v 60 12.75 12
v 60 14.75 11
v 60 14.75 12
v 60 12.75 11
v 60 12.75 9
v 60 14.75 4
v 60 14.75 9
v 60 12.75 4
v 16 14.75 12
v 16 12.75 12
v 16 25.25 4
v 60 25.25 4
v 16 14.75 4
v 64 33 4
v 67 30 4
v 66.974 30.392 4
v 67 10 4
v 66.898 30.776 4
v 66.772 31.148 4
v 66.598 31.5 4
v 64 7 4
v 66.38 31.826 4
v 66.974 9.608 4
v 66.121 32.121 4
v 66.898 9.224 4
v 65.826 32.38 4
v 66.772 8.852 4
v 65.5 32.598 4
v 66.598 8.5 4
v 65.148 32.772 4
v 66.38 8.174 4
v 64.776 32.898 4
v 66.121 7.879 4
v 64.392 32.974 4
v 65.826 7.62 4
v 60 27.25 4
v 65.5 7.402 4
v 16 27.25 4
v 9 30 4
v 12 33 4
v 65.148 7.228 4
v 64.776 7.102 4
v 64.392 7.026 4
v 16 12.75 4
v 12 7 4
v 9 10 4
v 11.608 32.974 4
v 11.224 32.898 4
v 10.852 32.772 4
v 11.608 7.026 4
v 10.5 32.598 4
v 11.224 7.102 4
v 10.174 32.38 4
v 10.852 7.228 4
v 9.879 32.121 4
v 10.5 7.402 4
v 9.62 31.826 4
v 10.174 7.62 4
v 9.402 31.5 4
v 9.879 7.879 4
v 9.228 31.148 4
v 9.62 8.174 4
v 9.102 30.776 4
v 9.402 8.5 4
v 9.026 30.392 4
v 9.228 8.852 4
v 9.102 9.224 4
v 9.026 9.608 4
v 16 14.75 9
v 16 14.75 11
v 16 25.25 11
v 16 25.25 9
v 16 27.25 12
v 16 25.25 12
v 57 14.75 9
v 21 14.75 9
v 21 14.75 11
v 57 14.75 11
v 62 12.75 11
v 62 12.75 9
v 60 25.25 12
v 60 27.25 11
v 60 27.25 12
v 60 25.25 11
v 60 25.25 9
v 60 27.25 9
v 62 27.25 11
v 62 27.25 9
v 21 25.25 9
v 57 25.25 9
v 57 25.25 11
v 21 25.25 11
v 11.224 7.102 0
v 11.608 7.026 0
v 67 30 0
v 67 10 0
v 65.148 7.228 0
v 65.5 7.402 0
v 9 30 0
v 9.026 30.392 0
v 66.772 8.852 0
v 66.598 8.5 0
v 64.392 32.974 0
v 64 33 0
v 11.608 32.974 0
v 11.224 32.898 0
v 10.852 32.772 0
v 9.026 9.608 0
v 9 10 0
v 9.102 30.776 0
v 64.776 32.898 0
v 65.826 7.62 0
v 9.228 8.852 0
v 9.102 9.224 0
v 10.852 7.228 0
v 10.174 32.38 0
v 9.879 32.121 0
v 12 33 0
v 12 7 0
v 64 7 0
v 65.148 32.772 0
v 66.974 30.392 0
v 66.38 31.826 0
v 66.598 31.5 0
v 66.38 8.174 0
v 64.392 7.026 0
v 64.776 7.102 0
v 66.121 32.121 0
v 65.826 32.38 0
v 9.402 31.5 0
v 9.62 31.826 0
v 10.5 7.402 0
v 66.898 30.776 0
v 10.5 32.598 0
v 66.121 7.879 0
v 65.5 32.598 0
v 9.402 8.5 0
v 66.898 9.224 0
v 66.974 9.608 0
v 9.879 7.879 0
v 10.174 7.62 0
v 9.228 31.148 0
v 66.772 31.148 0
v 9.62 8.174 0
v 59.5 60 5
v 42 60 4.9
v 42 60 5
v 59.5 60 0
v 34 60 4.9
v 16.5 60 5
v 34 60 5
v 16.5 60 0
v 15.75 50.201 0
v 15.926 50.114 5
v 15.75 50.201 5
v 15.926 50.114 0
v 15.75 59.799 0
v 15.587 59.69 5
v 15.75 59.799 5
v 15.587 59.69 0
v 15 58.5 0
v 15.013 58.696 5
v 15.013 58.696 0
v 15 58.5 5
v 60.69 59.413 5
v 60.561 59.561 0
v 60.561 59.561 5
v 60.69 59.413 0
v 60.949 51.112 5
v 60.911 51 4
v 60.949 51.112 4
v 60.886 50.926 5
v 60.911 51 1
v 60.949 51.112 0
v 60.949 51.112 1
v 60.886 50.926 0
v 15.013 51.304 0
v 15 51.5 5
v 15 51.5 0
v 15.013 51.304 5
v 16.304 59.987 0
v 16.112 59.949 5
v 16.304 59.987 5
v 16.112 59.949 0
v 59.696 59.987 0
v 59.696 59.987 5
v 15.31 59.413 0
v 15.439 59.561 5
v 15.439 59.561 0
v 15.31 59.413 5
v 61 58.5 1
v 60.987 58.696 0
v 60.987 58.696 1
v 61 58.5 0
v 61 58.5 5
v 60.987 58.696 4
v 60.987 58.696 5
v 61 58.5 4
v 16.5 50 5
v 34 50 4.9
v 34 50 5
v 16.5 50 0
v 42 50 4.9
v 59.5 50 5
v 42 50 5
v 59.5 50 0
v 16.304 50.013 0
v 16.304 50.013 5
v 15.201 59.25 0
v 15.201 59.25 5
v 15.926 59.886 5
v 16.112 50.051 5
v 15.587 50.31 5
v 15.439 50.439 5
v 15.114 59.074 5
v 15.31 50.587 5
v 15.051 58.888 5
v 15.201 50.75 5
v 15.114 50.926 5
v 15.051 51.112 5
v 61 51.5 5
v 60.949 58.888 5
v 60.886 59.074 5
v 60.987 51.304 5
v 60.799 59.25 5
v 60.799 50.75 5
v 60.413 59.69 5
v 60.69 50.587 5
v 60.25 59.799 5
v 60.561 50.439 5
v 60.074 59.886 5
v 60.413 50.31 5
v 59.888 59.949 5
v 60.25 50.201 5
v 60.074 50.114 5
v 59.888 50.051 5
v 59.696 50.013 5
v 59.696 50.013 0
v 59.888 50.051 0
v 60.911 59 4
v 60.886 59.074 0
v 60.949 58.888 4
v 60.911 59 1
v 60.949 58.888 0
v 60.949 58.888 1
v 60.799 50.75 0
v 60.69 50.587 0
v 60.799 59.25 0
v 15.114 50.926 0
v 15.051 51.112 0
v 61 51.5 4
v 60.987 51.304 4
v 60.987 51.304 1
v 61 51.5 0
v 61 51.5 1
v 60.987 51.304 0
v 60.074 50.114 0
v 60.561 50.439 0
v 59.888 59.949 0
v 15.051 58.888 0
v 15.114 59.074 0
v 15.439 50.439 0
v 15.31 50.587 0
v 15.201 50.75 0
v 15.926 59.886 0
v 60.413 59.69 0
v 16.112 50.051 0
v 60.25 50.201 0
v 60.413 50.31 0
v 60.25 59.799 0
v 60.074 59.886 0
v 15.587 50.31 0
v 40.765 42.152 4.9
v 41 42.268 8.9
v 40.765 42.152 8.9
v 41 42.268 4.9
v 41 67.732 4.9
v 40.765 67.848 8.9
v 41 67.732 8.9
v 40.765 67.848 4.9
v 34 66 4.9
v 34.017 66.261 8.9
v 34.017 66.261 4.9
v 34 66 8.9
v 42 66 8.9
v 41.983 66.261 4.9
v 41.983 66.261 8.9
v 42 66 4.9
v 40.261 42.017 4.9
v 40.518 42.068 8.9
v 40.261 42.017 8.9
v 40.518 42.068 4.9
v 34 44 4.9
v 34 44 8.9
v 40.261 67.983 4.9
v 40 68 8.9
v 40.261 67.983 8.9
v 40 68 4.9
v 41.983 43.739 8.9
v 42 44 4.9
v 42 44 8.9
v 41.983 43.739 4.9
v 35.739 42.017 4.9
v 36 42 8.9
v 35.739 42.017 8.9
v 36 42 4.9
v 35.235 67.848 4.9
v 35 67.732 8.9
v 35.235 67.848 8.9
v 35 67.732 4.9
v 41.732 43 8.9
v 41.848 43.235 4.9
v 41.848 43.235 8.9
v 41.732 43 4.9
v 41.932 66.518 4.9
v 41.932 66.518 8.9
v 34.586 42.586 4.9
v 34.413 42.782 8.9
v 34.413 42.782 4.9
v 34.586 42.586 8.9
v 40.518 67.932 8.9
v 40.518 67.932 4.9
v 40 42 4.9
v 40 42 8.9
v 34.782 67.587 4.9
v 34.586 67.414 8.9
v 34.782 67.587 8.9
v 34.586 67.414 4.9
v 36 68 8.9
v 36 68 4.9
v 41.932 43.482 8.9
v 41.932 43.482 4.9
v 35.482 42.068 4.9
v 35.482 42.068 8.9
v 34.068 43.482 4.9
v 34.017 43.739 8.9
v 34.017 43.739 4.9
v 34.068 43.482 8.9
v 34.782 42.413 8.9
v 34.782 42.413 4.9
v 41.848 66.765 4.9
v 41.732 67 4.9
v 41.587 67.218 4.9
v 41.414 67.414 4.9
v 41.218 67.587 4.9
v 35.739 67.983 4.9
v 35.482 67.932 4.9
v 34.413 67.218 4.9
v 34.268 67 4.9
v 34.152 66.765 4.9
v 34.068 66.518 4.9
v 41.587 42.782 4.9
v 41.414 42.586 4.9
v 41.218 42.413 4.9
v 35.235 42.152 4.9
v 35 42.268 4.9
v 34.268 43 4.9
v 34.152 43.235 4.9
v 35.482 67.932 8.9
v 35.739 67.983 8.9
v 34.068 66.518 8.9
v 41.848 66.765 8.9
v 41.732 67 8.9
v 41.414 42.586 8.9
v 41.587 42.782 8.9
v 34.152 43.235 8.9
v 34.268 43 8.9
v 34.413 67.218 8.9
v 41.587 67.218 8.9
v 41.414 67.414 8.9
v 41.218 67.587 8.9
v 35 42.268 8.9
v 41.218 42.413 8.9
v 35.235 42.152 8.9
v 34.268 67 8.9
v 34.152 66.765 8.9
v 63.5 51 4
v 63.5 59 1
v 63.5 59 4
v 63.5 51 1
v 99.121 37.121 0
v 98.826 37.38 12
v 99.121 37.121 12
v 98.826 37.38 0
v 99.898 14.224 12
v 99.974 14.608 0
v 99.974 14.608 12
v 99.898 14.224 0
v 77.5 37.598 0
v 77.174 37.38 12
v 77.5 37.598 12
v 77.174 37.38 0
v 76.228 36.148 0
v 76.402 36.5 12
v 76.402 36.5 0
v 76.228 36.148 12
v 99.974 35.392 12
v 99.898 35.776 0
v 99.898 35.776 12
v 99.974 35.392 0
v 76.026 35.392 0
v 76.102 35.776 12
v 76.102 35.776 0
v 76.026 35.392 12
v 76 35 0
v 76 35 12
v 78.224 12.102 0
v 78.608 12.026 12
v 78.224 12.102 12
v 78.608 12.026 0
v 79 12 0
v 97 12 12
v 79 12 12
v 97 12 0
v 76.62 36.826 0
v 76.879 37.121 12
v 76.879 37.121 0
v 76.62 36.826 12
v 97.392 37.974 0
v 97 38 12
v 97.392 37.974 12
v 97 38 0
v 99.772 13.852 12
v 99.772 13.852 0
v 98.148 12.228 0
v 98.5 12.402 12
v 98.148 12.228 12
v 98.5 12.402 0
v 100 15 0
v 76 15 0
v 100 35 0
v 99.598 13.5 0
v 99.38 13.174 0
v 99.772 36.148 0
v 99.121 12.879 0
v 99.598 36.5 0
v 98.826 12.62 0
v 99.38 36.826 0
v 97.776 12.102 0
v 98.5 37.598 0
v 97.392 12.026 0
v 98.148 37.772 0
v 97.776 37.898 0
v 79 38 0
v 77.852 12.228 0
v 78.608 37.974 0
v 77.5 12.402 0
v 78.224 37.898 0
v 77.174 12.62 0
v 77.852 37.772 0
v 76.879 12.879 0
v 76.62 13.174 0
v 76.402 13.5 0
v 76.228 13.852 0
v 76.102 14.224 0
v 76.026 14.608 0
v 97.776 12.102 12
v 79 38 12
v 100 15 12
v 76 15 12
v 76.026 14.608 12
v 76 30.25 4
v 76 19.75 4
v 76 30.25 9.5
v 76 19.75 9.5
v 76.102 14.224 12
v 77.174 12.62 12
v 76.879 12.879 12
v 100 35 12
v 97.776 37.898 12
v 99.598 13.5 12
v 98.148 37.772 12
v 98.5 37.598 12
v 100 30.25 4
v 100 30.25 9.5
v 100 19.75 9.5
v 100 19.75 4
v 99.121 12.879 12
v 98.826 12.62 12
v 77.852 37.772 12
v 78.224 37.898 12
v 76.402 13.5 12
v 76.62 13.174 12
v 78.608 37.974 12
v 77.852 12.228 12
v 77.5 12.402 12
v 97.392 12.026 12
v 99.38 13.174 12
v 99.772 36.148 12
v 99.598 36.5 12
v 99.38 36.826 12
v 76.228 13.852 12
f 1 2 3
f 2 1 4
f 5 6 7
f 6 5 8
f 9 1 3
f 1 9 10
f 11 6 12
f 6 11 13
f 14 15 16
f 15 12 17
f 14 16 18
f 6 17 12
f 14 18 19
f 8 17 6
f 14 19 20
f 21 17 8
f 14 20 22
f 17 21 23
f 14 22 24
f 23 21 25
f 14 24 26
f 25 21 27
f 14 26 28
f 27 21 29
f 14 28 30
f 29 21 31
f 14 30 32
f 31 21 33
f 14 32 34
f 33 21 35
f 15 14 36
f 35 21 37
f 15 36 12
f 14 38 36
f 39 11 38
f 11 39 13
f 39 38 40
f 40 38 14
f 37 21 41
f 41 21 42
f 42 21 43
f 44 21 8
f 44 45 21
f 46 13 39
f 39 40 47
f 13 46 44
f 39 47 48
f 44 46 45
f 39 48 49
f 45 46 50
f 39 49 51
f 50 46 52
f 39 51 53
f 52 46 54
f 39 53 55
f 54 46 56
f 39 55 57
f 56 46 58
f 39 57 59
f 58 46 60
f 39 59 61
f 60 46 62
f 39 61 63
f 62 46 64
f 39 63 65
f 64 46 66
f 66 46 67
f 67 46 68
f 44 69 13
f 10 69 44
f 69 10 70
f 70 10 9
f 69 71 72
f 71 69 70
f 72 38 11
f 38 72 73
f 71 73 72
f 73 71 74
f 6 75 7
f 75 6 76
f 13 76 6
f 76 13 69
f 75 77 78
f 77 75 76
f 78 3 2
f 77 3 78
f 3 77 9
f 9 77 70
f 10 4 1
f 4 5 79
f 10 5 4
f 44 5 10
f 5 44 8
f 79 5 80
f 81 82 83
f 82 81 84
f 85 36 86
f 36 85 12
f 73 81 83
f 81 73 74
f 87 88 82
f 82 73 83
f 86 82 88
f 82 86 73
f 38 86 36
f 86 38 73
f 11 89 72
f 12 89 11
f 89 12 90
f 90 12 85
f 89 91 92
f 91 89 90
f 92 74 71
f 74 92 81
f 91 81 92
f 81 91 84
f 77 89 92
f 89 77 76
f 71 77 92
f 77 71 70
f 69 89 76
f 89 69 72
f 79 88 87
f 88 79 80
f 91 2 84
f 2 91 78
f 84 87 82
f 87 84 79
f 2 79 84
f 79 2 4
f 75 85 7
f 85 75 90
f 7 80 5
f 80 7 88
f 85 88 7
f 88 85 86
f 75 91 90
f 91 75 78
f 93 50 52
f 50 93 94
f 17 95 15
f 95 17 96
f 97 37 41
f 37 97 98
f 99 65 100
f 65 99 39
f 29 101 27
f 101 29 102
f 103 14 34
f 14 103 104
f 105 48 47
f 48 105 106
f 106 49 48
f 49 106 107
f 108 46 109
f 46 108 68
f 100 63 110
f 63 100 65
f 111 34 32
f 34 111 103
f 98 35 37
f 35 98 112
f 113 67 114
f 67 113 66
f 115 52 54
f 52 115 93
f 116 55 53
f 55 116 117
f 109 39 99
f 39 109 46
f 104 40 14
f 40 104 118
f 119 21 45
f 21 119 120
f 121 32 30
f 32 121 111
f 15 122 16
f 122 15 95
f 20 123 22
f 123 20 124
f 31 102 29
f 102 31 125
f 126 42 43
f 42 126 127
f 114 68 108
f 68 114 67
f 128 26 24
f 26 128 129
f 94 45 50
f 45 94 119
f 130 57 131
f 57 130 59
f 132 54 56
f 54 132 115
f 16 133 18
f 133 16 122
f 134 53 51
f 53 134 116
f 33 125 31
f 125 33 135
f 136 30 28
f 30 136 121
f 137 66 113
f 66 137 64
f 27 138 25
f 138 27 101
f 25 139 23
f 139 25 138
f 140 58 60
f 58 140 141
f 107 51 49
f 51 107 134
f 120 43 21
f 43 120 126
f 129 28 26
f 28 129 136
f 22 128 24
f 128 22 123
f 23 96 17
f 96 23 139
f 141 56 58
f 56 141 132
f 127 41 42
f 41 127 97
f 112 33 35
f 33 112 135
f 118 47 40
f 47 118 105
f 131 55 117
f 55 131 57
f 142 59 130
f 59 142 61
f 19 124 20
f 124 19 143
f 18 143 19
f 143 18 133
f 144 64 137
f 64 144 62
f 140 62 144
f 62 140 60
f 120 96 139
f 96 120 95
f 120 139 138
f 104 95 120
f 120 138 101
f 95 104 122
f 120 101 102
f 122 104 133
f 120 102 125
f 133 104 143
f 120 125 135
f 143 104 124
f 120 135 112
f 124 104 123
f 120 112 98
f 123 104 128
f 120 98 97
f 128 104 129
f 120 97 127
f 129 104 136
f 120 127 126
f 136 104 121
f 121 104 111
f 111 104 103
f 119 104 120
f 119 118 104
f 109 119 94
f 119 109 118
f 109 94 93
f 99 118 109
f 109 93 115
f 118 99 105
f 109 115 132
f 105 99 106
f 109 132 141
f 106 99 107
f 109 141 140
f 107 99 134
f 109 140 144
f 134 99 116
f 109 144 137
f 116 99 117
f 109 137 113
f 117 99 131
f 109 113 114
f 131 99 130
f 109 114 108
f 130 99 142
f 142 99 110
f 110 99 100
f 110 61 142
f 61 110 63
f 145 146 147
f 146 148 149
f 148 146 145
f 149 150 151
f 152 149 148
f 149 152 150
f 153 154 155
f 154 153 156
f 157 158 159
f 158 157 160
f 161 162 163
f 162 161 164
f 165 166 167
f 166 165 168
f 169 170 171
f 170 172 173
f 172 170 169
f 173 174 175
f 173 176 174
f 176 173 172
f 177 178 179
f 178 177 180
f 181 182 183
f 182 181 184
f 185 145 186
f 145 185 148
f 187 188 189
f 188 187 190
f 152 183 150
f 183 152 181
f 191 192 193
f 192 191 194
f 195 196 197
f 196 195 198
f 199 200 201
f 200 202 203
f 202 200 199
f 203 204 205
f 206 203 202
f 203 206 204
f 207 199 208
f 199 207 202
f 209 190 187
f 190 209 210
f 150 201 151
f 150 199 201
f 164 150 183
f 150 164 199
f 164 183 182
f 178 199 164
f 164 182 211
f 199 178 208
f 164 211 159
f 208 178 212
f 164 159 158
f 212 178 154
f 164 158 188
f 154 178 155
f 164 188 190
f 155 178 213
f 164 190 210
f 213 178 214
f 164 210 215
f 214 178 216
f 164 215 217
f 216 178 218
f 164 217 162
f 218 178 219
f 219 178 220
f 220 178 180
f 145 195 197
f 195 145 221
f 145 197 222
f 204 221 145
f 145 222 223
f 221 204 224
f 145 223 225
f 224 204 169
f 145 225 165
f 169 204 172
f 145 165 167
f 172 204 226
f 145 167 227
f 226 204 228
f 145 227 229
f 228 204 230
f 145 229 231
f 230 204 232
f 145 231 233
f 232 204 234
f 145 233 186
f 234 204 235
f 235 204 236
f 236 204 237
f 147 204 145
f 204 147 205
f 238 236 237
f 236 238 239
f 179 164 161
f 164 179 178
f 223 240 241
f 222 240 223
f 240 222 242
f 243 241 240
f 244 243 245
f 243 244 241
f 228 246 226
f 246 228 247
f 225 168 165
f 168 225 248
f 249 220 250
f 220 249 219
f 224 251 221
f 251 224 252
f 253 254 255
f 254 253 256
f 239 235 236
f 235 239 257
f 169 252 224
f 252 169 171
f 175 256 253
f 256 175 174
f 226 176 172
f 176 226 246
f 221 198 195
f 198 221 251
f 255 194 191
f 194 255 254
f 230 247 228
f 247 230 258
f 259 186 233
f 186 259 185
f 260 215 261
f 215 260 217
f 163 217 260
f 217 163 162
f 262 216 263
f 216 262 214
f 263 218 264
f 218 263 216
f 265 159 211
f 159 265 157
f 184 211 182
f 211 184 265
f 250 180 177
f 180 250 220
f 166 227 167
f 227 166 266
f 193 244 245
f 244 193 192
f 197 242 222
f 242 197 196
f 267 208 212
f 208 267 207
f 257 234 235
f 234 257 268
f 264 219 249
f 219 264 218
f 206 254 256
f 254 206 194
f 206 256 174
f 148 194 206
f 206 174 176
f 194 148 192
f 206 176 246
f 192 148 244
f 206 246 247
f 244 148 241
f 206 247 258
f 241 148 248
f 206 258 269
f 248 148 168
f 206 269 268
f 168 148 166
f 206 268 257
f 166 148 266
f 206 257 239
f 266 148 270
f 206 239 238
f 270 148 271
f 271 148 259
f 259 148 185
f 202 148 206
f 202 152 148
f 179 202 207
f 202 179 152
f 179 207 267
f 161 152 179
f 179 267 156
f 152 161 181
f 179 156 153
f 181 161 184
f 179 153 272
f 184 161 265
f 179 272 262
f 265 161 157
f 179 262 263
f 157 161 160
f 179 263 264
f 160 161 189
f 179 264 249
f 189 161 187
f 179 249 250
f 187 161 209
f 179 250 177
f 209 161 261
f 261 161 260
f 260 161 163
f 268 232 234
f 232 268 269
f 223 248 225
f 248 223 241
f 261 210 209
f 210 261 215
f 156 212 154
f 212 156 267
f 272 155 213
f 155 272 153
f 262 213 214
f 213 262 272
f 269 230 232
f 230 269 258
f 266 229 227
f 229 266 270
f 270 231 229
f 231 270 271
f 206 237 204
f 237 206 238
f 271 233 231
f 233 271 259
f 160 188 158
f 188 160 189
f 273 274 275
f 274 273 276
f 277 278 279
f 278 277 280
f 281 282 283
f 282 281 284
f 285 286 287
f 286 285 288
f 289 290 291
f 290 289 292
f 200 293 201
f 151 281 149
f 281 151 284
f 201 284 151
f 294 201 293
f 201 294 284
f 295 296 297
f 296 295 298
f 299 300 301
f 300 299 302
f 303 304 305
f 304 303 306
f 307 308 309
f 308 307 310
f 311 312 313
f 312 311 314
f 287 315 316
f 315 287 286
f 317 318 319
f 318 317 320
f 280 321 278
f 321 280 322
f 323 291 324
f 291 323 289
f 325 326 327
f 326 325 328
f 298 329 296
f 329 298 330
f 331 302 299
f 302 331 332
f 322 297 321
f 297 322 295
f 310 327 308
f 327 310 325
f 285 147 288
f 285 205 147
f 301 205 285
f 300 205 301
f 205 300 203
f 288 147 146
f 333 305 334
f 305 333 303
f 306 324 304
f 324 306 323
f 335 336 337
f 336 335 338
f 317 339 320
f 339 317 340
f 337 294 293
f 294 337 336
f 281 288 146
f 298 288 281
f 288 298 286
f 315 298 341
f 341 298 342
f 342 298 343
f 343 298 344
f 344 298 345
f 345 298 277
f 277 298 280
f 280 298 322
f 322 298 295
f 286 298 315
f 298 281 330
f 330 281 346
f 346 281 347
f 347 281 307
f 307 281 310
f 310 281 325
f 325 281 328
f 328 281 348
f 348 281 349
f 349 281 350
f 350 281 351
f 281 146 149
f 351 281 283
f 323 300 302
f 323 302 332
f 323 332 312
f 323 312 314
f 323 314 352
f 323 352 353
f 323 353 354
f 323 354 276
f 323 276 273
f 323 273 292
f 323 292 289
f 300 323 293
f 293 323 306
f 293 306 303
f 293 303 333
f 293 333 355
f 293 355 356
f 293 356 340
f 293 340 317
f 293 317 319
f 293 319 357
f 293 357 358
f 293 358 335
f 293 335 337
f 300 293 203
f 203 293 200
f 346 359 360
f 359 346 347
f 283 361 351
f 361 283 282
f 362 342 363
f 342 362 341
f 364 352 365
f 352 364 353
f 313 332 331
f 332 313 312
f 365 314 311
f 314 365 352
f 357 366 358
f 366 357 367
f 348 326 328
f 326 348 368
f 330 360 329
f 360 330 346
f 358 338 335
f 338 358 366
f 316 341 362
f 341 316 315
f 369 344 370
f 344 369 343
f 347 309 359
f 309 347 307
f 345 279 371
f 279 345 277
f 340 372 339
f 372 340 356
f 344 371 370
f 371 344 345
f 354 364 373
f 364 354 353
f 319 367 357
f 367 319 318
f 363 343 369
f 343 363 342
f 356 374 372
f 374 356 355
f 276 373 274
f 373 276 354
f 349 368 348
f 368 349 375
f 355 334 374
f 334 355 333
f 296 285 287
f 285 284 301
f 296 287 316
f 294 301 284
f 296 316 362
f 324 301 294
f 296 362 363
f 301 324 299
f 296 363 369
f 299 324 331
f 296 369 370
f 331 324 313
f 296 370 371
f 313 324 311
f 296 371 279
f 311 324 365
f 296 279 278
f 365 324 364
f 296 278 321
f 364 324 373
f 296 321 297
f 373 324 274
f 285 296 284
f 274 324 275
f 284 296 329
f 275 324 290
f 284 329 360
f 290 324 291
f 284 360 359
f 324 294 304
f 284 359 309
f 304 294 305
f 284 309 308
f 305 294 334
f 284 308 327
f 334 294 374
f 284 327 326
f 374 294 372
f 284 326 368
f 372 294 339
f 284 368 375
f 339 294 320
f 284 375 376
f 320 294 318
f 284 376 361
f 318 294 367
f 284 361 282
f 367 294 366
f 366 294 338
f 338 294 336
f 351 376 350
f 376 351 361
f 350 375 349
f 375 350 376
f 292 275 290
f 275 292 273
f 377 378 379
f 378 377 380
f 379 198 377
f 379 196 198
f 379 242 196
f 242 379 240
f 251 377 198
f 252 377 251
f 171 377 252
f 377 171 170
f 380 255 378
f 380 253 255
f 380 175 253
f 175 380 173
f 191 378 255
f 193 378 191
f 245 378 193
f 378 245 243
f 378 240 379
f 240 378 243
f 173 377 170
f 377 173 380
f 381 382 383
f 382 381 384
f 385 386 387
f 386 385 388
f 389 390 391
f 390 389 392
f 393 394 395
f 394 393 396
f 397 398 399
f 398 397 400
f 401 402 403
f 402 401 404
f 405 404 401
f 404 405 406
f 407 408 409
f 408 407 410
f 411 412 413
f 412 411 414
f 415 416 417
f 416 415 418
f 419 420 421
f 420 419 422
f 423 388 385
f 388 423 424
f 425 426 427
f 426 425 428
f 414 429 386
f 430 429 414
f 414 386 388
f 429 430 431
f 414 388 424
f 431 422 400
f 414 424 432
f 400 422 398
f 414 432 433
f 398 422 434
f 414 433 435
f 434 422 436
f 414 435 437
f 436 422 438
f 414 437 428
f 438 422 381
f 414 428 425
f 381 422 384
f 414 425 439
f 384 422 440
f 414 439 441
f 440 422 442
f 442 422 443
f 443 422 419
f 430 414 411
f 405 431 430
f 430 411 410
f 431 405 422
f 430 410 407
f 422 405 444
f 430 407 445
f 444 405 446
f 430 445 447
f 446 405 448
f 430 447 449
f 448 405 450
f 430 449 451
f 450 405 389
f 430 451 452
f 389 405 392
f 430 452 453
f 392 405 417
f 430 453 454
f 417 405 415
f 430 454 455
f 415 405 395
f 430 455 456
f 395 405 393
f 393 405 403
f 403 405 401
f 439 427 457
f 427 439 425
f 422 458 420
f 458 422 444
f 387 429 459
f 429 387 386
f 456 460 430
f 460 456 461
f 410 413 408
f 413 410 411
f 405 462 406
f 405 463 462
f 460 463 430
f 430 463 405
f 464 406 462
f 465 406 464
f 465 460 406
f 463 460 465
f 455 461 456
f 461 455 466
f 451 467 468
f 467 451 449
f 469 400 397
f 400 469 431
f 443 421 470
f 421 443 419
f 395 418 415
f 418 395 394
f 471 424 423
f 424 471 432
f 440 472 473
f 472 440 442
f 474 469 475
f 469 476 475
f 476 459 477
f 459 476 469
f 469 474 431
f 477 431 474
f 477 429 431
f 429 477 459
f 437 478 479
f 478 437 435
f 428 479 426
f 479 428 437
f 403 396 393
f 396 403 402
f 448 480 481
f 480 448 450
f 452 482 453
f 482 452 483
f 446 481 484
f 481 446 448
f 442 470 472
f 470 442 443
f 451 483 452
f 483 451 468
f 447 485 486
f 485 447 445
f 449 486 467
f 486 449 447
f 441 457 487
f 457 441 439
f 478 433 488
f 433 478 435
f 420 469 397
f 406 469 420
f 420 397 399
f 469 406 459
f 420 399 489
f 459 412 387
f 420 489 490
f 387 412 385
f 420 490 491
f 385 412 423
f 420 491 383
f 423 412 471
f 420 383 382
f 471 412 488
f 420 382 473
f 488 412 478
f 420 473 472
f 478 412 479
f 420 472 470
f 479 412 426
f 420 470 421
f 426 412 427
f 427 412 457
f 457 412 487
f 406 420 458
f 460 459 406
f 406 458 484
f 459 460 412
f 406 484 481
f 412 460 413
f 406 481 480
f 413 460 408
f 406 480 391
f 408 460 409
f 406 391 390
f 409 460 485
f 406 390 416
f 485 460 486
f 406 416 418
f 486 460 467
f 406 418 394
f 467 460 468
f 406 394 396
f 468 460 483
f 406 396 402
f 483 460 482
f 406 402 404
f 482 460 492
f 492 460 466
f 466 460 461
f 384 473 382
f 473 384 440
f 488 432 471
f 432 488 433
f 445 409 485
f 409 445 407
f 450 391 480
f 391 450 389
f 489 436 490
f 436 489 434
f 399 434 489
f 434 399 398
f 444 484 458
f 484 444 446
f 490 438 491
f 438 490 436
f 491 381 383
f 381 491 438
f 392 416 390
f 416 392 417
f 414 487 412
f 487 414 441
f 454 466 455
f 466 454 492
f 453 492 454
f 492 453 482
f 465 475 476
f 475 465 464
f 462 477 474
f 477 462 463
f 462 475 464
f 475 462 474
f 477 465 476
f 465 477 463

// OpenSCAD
/*
Sample 082: Linearer Schubriegel — 0,25 mm
Generated from the FDM Mechanical Sample Library.
Units: millimetres.

Override examples:
  openscad -o custom.stl -D 'view="plate"' -D 'render_fn=64' model.scad
  openscad -o preview.png -D 'view="assembly"' model.scad
*/
use <../../../library/fdm_mechanisms.scad>

render_fn = is_undef(render_fn) ? 48 : render_fn;
view = is_undef(view) ? "plate" : view;
$fn = render_fn;

sample_slide_bolt(
    view=view,
    clearance=0.25,
    bolt_w=10,
    bolt_h=5
);
